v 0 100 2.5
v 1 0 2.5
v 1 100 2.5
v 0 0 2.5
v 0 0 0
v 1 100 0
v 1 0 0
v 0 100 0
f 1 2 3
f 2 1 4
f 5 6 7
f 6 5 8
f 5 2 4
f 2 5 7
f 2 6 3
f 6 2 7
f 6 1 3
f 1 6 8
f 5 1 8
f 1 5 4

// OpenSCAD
function ZipTieWidth()=2.5;
function ZipTieHeight()=1;
function ZipTieLength()=100;

module ZipTie()
{
	cube([ZipTieHeight(),ZipTieLength(), ZipTieWidth()]);
}

ZipTie();
